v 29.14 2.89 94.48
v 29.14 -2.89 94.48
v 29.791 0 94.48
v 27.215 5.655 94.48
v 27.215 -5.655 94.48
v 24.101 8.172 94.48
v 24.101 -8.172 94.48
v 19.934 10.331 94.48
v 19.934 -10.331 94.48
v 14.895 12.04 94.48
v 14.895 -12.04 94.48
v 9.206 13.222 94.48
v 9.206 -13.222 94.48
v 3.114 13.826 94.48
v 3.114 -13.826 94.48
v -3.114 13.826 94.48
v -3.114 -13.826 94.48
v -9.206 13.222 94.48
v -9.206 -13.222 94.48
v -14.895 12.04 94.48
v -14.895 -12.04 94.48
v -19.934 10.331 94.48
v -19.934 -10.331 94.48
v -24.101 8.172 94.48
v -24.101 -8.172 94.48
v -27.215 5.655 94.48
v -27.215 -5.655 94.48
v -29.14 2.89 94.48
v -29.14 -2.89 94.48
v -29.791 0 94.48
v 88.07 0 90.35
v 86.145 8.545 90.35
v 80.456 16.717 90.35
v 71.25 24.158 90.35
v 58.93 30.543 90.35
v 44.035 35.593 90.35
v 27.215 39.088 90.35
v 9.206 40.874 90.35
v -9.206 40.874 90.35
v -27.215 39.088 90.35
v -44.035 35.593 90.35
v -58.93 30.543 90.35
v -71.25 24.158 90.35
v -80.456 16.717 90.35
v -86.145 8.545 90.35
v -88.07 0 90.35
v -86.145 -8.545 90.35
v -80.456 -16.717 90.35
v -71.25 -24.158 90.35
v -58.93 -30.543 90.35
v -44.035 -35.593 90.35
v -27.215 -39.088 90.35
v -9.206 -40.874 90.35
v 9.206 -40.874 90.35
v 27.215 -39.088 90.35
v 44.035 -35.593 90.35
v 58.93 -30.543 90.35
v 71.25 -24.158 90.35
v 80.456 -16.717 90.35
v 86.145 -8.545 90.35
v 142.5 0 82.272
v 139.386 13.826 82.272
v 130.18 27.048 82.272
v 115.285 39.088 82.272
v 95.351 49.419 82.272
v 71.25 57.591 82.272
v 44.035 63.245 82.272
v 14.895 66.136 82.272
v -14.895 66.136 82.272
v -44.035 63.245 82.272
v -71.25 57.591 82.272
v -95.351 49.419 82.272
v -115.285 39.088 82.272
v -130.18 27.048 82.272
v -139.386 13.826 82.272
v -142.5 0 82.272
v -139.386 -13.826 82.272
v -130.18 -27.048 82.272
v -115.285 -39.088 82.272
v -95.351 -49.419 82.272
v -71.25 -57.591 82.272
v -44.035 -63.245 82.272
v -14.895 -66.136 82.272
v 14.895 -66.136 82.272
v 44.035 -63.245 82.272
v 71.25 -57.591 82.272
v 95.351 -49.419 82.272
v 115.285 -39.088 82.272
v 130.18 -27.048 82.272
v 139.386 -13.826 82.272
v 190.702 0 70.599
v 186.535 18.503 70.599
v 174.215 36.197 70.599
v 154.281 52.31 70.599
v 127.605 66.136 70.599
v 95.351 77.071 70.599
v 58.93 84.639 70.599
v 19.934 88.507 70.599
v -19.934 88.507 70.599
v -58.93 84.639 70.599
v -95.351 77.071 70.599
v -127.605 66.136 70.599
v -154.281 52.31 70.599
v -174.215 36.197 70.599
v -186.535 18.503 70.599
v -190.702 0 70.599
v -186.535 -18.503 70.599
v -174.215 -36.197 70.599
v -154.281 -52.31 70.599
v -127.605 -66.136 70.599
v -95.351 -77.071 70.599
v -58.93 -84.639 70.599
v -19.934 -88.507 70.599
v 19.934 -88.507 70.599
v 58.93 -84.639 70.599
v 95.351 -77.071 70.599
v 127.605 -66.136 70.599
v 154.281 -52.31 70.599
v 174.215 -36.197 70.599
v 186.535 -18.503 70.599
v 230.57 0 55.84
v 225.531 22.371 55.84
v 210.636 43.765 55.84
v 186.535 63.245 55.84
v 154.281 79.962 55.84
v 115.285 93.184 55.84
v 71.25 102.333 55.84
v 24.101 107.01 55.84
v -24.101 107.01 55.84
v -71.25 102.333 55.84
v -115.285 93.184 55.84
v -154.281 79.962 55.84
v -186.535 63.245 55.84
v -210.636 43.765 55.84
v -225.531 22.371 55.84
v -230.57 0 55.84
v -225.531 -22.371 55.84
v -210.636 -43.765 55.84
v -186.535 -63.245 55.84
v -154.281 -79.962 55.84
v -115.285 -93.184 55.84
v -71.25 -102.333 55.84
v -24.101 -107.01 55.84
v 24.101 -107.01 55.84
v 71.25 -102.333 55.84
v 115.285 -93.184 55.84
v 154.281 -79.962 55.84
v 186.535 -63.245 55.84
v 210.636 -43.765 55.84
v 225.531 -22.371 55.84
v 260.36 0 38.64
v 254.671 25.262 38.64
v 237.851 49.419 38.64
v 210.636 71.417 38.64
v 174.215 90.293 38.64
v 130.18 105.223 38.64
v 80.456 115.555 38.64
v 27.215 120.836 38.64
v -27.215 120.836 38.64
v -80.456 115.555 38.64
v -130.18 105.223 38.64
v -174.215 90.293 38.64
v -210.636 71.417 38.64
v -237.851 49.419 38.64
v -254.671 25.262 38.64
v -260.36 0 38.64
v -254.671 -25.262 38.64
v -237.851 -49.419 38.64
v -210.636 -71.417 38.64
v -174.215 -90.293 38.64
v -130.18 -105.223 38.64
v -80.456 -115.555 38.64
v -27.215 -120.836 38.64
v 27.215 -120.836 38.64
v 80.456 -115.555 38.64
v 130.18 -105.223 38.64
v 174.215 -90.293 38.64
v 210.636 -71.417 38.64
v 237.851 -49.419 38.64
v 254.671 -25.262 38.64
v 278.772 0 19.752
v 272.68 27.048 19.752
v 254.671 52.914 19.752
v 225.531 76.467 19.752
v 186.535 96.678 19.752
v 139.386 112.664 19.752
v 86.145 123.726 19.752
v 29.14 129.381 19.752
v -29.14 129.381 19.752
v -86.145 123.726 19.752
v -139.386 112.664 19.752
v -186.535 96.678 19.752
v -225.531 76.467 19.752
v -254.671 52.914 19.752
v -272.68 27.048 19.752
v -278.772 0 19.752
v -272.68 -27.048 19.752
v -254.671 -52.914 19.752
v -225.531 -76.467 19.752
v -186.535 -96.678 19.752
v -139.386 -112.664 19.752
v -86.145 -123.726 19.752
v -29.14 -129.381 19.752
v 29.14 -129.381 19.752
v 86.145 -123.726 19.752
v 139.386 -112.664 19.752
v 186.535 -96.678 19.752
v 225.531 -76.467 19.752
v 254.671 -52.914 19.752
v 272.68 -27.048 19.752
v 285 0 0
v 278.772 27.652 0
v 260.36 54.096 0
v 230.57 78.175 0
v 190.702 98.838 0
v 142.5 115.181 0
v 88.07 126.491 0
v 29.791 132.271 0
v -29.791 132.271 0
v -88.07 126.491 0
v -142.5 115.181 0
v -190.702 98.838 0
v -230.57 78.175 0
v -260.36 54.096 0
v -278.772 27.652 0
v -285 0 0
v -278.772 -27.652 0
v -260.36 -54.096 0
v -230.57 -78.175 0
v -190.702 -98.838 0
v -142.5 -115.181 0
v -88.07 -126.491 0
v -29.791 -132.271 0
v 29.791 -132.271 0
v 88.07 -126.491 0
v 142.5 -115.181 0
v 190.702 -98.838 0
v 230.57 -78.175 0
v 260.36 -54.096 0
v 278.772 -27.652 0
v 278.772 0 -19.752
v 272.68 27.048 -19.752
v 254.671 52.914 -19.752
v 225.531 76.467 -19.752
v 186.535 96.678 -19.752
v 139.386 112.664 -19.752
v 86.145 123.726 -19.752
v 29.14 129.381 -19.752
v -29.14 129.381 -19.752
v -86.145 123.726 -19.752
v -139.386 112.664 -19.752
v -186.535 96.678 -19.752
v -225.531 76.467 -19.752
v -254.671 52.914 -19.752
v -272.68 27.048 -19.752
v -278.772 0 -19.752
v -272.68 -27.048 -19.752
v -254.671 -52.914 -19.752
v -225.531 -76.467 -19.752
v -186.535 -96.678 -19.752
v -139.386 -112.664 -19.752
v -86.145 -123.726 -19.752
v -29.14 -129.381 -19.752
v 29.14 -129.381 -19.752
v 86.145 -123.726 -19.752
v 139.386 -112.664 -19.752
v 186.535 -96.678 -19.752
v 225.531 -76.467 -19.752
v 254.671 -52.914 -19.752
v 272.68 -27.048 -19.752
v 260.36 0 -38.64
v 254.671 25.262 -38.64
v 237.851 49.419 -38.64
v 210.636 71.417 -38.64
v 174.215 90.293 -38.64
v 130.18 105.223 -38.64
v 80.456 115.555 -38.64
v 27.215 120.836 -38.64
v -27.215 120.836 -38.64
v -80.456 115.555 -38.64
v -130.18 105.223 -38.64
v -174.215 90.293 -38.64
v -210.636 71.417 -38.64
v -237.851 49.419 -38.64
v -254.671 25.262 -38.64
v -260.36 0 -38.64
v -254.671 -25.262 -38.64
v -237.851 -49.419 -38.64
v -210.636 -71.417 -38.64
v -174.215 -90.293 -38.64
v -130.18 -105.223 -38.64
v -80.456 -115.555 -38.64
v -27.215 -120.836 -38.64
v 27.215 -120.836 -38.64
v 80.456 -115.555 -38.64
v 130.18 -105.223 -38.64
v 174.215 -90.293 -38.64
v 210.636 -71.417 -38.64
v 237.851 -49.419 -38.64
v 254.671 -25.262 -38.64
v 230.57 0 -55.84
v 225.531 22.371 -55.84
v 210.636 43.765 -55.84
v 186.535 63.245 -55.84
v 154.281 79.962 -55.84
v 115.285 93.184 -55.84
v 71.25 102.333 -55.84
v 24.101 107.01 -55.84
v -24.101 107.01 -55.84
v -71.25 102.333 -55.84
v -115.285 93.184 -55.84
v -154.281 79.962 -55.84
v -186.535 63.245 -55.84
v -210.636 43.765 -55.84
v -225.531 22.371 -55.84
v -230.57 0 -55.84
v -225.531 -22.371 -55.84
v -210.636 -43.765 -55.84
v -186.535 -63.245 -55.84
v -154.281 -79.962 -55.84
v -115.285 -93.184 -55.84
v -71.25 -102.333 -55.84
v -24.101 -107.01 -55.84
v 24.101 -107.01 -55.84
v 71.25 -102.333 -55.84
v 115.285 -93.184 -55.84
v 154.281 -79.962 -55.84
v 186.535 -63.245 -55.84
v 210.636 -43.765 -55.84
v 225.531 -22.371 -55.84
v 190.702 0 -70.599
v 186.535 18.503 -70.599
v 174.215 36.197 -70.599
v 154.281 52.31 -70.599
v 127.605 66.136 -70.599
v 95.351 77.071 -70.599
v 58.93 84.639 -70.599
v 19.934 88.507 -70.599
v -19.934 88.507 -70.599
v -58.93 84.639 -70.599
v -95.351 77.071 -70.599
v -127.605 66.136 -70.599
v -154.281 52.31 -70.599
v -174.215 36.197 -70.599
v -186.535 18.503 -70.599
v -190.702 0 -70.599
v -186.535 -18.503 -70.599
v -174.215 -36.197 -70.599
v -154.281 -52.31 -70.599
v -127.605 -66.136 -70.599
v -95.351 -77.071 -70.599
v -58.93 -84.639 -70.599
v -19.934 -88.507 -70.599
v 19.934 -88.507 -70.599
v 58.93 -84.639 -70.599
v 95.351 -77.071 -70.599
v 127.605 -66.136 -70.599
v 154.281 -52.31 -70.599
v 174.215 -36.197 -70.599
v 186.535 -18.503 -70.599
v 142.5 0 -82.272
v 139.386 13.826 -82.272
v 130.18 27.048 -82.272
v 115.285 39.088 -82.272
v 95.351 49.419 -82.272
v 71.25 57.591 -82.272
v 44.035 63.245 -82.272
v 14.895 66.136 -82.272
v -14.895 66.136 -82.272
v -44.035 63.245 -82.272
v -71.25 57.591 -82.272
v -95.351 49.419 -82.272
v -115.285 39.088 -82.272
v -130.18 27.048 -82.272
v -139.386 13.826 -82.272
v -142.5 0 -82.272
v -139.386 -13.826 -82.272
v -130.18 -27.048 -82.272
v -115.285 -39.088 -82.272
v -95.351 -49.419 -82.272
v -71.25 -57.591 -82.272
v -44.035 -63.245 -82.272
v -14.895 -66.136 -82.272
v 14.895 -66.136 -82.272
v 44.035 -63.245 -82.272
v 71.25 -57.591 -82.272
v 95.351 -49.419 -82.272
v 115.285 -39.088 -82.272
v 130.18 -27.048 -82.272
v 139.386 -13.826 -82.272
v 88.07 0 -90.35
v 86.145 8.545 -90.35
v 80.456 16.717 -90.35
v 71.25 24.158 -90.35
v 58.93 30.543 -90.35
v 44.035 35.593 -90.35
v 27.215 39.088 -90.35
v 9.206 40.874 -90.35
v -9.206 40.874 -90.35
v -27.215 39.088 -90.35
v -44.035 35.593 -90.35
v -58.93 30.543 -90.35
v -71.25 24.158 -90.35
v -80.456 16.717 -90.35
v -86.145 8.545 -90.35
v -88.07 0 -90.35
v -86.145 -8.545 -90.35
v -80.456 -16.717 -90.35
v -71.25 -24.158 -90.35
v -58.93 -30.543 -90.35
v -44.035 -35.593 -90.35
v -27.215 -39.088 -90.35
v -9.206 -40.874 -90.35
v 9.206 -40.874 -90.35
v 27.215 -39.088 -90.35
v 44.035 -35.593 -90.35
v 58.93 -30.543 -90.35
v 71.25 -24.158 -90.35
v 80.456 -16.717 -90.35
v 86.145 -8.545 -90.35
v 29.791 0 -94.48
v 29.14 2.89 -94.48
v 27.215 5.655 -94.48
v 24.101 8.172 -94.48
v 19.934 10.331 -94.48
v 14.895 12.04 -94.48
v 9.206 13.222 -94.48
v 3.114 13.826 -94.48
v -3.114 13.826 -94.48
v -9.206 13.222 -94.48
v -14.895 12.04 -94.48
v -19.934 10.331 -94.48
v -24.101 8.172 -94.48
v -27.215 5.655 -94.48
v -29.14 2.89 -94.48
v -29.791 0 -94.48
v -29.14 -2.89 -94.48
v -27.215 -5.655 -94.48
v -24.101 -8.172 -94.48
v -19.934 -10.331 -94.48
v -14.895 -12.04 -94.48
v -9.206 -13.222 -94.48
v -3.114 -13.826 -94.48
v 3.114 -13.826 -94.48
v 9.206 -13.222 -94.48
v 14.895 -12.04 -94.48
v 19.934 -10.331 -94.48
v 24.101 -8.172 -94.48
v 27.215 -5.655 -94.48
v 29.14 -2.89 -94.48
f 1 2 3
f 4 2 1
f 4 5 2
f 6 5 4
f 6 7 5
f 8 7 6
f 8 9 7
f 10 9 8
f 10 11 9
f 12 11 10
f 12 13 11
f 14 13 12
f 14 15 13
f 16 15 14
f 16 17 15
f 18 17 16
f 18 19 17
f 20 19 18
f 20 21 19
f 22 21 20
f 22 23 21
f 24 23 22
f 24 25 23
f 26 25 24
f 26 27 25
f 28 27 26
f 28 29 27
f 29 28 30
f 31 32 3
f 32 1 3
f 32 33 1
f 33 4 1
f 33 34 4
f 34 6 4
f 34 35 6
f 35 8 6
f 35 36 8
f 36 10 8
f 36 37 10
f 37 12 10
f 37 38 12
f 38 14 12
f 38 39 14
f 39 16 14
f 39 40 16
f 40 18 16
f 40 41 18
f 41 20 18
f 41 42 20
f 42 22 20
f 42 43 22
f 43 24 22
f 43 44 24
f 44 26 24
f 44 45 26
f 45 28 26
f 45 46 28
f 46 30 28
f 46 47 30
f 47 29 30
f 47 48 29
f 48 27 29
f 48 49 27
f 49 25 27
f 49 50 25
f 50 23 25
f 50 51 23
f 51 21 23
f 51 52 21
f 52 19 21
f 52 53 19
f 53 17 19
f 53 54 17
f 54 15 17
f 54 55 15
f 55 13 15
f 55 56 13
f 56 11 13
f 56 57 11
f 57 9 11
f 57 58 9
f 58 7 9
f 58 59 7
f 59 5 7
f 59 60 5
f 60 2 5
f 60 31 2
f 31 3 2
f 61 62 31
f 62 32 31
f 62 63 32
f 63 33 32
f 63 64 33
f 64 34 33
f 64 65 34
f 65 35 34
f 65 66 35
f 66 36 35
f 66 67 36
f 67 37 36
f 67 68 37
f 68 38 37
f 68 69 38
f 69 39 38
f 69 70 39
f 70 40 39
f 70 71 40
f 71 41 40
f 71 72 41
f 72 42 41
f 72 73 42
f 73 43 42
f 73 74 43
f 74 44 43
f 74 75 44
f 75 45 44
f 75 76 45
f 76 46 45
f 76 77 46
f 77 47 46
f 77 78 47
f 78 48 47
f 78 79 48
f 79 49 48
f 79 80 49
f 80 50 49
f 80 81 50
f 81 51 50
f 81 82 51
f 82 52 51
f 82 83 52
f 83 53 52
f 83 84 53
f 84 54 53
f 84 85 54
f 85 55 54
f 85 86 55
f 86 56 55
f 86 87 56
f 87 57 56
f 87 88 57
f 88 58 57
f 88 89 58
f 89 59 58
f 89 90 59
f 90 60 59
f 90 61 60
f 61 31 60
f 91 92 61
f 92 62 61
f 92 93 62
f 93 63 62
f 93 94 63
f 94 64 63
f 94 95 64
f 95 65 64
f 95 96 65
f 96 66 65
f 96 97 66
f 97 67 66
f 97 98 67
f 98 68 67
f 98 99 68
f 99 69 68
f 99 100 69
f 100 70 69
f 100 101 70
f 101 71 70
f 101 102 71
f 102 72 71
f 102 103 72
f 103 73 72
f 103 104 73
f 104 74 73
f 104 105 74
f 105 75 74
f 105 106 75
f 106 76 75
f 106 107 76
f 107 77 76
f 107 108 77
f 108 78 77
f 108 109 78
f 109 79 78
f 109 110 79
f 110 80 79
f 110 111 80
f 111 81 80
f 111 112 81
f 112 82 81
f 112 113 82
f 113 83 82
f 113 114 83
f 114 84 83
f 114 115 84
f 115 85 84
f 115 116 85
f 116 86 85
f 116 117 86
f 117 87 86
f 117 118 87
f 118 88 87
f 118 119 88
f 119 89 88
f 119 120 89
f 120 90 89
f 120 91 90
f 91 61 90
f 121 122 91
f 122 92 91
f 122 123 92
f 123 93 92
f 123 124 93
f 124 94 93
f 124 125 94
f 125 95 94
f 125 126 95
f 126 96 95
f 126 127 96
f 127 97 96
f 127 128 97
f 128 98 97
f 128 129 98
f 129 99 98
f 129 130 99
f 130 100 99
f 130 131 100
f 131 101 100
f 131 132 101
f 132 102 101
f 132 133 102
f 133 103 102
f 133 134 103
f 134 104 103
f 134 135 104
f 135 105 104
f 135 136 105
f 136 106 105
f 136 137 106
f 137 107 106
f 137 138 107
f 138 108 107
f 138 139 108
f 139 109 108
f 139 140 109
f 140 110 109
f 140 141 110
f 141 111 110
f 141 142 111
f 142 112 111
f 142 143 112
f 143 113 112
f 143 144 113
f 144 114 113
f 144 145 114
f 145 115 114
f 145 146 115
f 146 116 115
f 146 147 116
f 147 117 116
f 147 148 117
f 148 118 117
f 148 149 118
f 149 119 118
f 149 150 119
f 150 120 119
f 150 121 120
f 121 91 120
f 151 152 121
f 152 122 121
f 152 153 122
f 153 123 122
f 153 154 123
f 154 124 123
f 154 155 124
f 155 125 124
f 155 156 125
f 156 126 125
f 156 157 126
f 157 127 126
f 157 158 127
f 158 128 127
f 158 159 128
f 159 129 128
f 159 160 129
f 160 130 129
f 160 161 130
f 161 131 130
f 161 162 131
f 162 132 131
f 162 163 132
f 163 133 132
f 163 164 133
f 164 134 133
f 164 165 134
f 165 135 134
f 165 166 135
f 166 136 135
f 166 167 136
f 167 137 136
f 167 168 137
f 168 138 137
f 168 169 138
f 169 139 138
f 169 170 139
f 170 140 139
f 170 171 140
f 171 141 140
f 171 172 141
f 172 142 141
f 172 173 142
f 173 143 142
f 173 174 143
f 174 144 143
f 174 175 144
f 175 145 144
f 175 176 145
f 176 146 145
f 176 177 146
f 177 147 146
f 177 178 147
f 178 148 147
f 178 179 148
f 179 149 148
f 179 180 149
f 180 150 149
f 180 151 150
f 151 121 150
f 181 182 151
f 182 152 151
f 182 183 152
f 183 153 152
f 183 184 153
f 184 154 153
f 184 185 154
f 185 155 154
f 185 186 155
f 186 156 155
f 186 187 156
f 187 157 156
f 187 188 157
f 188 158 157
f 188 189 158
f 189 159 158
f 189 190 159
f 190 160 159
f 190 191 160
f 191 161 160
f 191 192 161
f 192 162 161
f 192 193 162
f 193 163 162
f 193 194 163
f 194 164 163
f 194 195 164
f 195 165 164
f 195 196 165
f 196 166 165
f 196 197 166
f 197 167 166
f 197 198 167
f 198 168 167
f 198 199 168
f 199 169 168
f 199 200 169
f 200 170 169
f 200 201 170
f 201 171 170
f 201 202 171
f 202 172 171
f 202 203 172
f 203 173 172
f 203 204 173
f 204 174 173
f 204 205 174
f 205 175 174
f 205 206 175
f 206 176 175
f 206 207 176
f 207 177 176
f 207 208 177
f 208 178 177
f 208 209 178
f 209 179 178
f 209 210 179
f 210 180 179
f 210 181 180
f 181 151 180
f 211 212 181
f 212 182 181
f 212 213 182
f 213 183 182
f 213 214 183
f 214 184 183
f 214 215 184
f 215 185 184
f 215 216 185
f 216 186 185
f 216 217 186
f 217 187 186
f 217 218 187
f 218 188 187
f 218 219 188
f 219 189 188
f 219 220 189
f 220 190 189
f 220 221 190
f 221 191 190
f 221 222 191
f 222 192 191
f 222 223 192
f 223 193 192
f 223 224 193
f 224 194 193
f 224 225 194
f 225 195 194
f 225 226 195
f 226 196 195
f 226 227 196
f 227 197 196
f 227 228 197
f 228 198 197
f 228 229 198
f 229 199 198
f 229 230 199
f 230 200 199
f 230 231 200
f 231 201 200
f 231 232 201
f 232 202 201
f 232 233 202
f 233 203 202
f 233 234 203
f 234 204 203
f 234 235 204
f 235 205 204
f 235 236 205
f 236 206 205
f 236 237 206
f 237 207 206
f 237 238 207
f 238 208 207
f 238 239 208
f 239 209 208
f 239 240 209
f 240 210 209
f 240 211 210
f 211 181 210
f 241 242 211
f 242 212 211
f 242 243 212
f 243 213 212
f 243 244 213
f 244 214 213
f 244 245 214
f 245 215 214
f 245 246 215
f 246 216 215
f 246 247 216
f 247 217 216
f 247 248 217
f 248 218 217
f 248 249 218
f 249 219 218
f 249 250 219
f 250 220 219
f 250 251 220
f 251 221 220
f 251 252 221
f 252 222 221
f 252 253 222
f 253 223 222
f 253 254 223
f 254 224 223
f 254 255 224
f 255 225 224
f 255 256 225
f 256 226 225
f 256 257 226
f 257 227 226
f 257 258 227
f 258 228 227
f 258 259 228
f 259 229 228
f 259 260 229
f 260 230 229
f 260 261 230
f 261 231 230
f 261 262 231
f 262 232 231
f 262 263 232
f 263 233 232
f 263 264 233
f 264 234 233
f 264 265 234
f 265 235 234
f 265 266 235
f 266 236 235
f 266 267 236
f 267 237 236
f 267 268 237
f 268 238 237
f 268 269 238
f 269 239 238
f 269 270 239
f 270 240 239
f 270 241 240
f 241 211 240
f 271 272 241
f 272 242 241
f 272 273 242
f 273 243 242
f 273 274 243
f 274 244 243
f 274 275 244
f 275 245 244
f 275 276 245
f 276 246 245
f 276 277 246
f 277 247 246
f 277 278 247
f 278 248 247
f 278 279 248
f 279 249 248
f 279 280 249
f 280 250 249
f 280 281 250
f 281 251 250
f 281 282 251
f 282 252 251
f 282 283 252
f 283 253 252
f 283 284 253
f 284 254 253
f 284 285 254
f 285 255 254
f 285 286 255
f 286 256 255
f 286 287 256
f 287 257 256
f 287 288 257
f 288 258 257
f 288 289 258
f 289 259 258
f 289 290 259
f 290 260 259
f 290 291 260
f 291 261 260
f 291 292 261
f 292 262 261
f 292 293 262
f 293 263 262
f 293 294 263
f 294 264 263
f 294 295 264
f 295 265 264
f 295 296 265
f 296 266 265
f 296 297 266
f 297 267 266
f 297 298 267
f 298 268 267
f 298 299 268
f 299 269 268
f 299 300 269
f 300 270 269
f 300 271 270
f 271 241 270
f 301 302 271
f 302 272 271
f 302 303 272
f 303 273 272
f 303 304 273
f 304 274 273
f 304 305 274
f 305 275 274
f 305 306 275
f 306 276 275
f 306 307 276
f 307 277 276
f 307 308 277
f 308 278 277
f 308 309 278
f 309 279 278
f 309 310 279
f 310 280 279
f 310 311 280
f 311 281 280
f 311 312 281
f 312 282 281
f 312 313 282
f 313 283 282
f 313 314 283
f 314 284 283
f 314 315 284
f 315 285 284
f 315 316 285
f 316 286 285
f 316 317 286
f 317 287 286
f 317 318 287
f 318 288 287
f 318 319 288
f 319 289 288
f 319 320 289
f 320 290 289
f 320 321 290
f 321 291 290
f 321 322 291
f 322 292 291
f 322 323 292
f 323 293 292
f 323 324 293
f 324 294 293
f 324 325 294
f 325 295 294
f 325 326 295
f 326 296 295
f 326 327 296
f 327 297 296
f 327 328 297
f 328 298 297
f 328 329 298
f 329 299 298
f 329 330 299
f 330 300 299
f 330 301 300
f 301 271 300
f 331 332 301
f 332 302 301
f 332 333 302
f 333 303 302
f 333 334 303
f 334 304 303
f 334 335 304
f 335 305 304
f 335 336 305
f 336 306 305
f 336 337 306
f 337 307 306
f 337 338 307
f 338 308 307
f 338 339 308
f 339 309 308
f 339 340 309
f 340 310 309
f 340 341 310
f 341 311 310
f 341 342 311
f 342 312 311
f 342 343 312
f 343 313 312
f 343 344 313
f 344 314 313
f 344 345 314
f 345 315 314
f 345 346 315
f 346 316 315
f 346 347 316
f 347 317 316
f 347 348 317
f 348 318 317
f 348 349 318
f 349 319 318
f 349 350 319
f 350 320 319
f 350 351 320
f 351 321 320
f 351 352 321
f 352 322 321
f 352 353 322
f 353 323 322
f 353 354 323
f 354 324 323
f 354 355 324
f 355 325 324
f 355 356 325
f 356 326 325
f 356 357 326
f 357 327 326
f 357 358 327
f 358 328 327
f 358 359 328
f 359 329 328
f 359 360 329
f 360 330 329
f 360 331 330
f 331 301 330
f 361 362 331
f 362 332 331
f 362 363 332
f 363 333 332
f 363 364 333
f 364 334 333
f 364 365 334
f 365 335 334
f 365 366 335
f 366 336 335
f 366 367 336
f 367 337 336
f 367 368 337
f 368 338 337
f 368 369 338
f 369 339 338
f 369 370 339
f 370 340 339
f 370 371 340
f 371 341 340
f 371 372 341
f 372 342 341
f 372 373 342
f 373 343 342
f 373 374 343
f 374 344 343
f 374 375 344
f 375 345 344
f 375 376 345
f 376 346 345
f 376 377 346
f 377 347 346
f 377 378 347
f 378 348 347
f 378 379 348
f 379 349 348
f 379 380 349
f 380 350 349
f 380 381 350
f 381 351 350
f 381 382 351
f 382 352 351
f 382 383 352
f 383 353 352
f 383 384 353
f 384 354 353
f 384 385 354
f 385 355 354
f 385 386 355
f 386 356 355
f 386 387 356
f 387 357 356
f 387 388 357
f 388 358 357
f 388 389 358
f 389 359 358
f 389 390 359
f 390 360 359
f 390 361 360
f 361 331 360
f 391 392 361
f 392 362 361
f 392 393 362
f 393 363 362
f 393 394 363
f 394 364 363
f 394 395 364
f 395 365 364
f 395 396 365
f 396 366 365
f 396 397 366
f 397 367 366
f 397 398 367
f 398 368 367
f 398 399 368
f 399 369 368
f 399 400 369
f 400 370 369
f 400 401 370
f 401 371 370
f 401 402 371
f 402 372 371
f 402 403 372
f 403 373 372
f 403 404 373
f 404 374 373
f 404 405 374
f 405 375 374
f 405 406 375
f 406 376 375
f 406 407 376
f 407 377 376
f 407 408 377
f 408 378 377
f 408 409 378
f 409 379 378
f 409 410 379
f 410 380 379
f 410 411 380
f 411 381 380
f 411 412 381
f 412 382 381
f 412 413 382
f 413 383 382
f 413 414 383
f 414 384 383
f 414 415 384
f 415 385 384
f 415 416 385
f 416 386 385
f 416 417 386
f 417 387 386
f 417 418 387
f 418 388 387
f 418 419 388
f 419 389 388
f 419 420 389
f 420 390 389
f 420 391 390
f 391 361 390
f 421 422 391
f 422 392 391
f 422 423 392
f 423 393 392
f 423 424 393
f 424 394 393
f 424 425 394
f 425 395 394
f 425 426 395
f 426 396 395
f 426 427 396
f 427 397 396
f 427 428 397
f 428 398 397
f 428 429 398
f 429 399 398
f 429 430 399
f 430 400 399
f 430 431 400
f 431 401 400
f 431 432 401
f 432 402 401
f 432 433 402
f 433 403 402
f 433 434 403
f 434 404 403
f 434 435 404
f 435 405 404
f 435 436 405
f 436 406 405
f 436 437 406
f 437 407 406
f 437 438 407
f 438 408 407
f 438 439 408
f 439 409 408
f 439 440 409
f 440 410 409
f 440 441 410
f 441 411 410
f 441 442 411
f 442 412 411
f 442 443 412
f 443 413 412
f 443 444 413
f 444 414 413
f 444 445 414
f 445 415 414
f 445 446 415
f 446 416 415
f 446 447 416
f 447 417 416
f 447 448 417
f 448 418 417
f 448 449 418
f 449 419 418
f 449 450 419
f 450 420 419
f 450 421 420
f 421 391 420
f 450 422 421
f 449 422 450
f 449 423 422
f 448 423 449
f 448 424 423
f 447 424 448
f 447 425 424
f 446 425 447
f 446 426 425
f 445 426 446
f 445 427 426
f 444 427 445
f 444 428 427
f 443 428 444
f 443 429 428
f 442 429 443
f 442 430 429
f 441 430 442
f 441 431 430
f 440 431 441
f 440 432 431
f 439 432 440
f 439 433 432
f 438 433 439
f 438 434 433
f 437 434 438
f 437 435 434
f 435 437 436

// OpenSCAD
// Generated by SolidPython 1.0.1 on 2020-07-29 00:46:51


scale(v = [15, 7, 5]) {
	sphere(r = 19);
}
/***********************************************
*********      SolidPython code:      **********
************************************************
 
# import packages: SolidPython
from solid import *
from solid.utils import *
from itertools import chain, combinations, permutations


class Resize:

    def __init__(self, scad_file):
        self.scad_file = scad_file
        #self.scad_file = import_scad(scad_file)
        # cone/cylinder param:
        self.r1 = 0
        self.r2 = 0
        self.h = 0
        # rectangular prism param:
        self.w = 0
        self.l = 0
        # ellipse param:
        self.r = 0

    # import OpenScad code (file name corresponds to shape)


    # classify shape + parameters
    def assign(self, param1, param2, param3):
        if self.scad_file == 'cone.scad':
            self.r1 = param1
            self.r2 = param2
            self.h = param3
        elif self.scad_file == 'cylinder.scad':
            self.r1 = param1
            self.r2 = param2
            self.h = param3
        elif self.scad_file == 'rectangularPrism.scad':
            self.h = param1
            self.l = param2
            self.w = param3
        else:
            self.r = param1
            self.h = param2

    # resize parameters
    def iterate(self):
        x = range(3, 20, 2)
        i = 1
        if self.scad_file == 'cone.scad':
            tempList = list(permutations(x, 2))
            for temp in tempList:
                param1 = temp[0]
                param2 = temp[1]
                filepath = 'produced_scad_files/' + 'cone' + str(param1) + '_' + str(param2) + '_' + '.scad'
                scad_render_to_file(cylinder(h=param1, r1=param2, r2=0), filepath)

        elif self.scad_file == 'cylinder.scad':
            tempList = list(permutations(x, 3))
            for temp in tempList:
                param1 = temp[0]
                param2 = temp[1]
                filepath = 'produced_scad_files/' + 'cylinder' + str(param1) + '_' + str(param2) + '_' + '.scad'
                scad_render_to_file(cylinder(h=param1, r1=param2, r2=param2), filepath)

        elif self.scad_file == 'rectangularPrism.scad':
            tempList = list(permutations(x, 3))
            for temp in tempList:
                param1 = temp[0]
                param2 = temp[1]
                param3 = temp[2]
                filepath = 'produced_scad_files/' + 'rectangularPrism' + str(param1) + '_' + str(param2) + '_' + str(
                    param3) + '.scad'
                scad_render_to_file(cube(size=(param1, param2, param3)), filepath)

        elif self.scad_file == 'ellipse.scad':
            tempList = list(permutations(x, 4))
            for temp in tempList:
                param1 = temp[0]
                param2 = temp[1]
                param3 = temp[2]
                param4 = temp[3]
                filepath = 'produced_scad_files/' + 'ellipse' + str(param1) + '_' + str(param2) + '_' + str(param3) + '_' + str(param4) + '.scad'
                scad_render_to_file(scale([param1, param2, param3])(sphere(r=param4)), filepath)

    def render_to_scadfile(self):
        scad_render_to_file(scad, 'example.scad') 
 
************************************************/
